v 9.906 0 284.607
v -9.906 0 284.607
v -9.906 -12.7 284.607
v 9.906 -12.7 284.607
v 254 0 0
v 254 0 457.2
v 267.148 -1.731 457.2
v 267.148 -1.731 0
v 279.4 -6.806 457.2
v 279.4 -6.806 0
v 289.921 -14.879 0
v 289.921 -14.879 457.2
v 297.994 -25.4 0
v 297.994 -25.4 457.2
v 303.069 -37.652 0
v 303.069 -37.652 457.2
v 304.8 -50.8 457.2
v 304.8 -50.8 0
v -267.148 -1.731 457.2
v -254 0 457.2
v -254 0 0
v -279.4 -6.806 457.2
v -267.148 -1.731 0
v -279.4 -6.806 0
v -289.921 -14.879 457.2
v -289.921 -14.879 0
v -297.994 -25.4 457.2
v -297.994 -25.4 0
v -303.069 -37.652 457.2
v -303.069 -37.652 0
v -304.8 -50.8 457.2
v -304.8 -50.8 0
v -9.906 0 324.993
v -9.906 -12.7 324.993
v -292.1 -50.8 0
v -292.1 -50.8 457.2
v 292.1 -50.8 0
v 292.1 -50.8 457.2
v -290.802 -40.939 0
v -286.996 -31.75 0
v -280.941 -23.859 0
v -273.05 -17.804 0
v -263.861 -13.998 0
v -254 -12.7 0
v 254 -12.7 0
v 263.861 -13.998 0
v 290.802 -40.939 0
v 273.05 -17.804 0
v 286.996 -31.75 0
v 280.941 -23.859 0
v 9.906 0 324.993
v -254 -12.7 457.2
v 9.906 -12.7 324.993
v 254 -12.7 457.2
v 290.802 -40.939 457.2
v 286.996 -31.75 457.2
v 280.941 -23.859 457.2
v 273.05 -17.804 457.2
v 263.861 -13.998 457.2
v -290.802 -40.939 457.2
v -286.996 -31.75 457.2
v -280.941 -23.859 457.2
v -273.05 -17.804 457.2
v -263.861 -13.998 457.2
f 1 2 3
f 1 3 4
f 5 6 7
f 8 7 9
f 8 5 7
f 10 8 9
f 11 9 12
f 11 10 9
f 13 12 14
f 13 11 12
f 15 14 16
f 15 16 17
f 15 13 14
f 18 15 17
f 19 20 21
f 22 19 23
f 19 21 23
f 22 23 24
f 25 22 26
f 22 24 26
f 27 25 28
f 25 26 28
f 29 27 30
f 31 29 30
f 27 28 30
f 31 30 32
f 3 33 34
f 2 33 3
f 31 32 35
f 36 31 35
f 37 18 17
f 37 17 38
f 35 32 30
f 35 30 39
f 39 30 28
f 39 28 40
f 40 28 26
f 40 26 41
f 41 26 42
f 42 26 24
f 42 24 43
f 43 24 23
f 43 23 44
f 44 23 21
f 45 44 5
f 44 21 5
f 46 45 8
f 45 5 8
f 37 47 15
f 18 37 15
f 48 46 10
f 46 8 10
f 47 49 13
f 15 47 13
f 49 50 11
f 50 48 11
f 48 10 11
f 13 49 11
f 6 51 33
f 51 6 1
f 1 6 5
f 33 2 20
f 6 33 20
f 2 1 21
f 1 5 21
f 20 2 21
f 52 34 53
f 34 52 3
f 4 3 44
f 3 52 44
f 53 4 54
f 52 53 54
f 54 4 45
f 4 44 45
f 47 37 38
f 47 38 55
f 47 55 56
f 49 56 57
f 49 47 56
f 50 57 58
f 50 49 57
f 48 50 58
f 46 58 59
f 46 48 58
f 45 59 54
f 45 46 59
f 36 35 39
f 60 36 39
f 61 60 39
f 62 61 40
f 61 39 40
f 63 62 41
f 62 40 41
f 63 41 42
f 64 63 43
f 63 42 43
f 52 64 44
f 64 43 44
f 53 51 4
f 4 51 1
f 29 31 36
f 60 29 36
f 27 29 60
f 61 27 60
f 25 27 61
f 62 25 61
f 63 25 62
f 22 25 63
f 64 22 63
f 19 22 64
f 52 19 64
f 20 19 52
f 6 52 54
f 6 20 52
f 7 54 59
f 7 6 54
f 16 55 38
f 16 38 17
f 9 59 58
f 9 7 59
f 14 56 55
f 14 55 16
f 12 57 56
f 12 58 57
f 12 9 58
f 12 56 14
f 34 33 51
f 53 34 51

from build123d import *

# Parameters (mm, degrees)
EXTRUDE_THIN1_DEPTH = 457.2
SKETCH5_W           = 19.812
SKETCH5_H           = 40.386
CUT_EXTRUDE1_DEPTH  = 51.8


with BuildPart() as part:
    # Sketch1 → Extrude-Thin1 (new body)
    with BuildSketch(Plane.XY):
        with BuildLine():
            Line((0, 0), (254, 0))
            ThreePointArc((254, 0), (289.921024484, -14.878975516), (304.8, -50.8))
            Line((304.8, -50.8), (292.1, -50.8))
            ThreePointArc((292.1, -50.8), (280.940768363, -23.859231637), (254, -12.7))
            Line((254, -12.7), (0, -12.7))
            Line((0, -12.7), (0, 0))
        make_face()
    extrude_thin1 = extrude(amount=EXTRUDE_THIN1_DEPTH)

    # Mirror1: Extrude-Thin1 across plane
    add(extrude_thin1.mirror(Plane(origin=(0, -12.7, 457.2), x_dir=(0, 0, 1), z_dir=(-1, 0, 0))))

    # Sketch5 → Cut-Extrude1 (cut, through all)
    with BuildSketch(Plane(origin=(0, 0, 0), x_dir=(1, 0, 0), z_dir=(0, 1, 0))):
        with Locations((0, -304.8)):
            Rectangle(SKETCH5_W, SKETCH5_H)
    extrude(amount=-CUT_EXTRUDE1_DEPTH, mode=Mode.SUBTRACT)


solid = part.part
